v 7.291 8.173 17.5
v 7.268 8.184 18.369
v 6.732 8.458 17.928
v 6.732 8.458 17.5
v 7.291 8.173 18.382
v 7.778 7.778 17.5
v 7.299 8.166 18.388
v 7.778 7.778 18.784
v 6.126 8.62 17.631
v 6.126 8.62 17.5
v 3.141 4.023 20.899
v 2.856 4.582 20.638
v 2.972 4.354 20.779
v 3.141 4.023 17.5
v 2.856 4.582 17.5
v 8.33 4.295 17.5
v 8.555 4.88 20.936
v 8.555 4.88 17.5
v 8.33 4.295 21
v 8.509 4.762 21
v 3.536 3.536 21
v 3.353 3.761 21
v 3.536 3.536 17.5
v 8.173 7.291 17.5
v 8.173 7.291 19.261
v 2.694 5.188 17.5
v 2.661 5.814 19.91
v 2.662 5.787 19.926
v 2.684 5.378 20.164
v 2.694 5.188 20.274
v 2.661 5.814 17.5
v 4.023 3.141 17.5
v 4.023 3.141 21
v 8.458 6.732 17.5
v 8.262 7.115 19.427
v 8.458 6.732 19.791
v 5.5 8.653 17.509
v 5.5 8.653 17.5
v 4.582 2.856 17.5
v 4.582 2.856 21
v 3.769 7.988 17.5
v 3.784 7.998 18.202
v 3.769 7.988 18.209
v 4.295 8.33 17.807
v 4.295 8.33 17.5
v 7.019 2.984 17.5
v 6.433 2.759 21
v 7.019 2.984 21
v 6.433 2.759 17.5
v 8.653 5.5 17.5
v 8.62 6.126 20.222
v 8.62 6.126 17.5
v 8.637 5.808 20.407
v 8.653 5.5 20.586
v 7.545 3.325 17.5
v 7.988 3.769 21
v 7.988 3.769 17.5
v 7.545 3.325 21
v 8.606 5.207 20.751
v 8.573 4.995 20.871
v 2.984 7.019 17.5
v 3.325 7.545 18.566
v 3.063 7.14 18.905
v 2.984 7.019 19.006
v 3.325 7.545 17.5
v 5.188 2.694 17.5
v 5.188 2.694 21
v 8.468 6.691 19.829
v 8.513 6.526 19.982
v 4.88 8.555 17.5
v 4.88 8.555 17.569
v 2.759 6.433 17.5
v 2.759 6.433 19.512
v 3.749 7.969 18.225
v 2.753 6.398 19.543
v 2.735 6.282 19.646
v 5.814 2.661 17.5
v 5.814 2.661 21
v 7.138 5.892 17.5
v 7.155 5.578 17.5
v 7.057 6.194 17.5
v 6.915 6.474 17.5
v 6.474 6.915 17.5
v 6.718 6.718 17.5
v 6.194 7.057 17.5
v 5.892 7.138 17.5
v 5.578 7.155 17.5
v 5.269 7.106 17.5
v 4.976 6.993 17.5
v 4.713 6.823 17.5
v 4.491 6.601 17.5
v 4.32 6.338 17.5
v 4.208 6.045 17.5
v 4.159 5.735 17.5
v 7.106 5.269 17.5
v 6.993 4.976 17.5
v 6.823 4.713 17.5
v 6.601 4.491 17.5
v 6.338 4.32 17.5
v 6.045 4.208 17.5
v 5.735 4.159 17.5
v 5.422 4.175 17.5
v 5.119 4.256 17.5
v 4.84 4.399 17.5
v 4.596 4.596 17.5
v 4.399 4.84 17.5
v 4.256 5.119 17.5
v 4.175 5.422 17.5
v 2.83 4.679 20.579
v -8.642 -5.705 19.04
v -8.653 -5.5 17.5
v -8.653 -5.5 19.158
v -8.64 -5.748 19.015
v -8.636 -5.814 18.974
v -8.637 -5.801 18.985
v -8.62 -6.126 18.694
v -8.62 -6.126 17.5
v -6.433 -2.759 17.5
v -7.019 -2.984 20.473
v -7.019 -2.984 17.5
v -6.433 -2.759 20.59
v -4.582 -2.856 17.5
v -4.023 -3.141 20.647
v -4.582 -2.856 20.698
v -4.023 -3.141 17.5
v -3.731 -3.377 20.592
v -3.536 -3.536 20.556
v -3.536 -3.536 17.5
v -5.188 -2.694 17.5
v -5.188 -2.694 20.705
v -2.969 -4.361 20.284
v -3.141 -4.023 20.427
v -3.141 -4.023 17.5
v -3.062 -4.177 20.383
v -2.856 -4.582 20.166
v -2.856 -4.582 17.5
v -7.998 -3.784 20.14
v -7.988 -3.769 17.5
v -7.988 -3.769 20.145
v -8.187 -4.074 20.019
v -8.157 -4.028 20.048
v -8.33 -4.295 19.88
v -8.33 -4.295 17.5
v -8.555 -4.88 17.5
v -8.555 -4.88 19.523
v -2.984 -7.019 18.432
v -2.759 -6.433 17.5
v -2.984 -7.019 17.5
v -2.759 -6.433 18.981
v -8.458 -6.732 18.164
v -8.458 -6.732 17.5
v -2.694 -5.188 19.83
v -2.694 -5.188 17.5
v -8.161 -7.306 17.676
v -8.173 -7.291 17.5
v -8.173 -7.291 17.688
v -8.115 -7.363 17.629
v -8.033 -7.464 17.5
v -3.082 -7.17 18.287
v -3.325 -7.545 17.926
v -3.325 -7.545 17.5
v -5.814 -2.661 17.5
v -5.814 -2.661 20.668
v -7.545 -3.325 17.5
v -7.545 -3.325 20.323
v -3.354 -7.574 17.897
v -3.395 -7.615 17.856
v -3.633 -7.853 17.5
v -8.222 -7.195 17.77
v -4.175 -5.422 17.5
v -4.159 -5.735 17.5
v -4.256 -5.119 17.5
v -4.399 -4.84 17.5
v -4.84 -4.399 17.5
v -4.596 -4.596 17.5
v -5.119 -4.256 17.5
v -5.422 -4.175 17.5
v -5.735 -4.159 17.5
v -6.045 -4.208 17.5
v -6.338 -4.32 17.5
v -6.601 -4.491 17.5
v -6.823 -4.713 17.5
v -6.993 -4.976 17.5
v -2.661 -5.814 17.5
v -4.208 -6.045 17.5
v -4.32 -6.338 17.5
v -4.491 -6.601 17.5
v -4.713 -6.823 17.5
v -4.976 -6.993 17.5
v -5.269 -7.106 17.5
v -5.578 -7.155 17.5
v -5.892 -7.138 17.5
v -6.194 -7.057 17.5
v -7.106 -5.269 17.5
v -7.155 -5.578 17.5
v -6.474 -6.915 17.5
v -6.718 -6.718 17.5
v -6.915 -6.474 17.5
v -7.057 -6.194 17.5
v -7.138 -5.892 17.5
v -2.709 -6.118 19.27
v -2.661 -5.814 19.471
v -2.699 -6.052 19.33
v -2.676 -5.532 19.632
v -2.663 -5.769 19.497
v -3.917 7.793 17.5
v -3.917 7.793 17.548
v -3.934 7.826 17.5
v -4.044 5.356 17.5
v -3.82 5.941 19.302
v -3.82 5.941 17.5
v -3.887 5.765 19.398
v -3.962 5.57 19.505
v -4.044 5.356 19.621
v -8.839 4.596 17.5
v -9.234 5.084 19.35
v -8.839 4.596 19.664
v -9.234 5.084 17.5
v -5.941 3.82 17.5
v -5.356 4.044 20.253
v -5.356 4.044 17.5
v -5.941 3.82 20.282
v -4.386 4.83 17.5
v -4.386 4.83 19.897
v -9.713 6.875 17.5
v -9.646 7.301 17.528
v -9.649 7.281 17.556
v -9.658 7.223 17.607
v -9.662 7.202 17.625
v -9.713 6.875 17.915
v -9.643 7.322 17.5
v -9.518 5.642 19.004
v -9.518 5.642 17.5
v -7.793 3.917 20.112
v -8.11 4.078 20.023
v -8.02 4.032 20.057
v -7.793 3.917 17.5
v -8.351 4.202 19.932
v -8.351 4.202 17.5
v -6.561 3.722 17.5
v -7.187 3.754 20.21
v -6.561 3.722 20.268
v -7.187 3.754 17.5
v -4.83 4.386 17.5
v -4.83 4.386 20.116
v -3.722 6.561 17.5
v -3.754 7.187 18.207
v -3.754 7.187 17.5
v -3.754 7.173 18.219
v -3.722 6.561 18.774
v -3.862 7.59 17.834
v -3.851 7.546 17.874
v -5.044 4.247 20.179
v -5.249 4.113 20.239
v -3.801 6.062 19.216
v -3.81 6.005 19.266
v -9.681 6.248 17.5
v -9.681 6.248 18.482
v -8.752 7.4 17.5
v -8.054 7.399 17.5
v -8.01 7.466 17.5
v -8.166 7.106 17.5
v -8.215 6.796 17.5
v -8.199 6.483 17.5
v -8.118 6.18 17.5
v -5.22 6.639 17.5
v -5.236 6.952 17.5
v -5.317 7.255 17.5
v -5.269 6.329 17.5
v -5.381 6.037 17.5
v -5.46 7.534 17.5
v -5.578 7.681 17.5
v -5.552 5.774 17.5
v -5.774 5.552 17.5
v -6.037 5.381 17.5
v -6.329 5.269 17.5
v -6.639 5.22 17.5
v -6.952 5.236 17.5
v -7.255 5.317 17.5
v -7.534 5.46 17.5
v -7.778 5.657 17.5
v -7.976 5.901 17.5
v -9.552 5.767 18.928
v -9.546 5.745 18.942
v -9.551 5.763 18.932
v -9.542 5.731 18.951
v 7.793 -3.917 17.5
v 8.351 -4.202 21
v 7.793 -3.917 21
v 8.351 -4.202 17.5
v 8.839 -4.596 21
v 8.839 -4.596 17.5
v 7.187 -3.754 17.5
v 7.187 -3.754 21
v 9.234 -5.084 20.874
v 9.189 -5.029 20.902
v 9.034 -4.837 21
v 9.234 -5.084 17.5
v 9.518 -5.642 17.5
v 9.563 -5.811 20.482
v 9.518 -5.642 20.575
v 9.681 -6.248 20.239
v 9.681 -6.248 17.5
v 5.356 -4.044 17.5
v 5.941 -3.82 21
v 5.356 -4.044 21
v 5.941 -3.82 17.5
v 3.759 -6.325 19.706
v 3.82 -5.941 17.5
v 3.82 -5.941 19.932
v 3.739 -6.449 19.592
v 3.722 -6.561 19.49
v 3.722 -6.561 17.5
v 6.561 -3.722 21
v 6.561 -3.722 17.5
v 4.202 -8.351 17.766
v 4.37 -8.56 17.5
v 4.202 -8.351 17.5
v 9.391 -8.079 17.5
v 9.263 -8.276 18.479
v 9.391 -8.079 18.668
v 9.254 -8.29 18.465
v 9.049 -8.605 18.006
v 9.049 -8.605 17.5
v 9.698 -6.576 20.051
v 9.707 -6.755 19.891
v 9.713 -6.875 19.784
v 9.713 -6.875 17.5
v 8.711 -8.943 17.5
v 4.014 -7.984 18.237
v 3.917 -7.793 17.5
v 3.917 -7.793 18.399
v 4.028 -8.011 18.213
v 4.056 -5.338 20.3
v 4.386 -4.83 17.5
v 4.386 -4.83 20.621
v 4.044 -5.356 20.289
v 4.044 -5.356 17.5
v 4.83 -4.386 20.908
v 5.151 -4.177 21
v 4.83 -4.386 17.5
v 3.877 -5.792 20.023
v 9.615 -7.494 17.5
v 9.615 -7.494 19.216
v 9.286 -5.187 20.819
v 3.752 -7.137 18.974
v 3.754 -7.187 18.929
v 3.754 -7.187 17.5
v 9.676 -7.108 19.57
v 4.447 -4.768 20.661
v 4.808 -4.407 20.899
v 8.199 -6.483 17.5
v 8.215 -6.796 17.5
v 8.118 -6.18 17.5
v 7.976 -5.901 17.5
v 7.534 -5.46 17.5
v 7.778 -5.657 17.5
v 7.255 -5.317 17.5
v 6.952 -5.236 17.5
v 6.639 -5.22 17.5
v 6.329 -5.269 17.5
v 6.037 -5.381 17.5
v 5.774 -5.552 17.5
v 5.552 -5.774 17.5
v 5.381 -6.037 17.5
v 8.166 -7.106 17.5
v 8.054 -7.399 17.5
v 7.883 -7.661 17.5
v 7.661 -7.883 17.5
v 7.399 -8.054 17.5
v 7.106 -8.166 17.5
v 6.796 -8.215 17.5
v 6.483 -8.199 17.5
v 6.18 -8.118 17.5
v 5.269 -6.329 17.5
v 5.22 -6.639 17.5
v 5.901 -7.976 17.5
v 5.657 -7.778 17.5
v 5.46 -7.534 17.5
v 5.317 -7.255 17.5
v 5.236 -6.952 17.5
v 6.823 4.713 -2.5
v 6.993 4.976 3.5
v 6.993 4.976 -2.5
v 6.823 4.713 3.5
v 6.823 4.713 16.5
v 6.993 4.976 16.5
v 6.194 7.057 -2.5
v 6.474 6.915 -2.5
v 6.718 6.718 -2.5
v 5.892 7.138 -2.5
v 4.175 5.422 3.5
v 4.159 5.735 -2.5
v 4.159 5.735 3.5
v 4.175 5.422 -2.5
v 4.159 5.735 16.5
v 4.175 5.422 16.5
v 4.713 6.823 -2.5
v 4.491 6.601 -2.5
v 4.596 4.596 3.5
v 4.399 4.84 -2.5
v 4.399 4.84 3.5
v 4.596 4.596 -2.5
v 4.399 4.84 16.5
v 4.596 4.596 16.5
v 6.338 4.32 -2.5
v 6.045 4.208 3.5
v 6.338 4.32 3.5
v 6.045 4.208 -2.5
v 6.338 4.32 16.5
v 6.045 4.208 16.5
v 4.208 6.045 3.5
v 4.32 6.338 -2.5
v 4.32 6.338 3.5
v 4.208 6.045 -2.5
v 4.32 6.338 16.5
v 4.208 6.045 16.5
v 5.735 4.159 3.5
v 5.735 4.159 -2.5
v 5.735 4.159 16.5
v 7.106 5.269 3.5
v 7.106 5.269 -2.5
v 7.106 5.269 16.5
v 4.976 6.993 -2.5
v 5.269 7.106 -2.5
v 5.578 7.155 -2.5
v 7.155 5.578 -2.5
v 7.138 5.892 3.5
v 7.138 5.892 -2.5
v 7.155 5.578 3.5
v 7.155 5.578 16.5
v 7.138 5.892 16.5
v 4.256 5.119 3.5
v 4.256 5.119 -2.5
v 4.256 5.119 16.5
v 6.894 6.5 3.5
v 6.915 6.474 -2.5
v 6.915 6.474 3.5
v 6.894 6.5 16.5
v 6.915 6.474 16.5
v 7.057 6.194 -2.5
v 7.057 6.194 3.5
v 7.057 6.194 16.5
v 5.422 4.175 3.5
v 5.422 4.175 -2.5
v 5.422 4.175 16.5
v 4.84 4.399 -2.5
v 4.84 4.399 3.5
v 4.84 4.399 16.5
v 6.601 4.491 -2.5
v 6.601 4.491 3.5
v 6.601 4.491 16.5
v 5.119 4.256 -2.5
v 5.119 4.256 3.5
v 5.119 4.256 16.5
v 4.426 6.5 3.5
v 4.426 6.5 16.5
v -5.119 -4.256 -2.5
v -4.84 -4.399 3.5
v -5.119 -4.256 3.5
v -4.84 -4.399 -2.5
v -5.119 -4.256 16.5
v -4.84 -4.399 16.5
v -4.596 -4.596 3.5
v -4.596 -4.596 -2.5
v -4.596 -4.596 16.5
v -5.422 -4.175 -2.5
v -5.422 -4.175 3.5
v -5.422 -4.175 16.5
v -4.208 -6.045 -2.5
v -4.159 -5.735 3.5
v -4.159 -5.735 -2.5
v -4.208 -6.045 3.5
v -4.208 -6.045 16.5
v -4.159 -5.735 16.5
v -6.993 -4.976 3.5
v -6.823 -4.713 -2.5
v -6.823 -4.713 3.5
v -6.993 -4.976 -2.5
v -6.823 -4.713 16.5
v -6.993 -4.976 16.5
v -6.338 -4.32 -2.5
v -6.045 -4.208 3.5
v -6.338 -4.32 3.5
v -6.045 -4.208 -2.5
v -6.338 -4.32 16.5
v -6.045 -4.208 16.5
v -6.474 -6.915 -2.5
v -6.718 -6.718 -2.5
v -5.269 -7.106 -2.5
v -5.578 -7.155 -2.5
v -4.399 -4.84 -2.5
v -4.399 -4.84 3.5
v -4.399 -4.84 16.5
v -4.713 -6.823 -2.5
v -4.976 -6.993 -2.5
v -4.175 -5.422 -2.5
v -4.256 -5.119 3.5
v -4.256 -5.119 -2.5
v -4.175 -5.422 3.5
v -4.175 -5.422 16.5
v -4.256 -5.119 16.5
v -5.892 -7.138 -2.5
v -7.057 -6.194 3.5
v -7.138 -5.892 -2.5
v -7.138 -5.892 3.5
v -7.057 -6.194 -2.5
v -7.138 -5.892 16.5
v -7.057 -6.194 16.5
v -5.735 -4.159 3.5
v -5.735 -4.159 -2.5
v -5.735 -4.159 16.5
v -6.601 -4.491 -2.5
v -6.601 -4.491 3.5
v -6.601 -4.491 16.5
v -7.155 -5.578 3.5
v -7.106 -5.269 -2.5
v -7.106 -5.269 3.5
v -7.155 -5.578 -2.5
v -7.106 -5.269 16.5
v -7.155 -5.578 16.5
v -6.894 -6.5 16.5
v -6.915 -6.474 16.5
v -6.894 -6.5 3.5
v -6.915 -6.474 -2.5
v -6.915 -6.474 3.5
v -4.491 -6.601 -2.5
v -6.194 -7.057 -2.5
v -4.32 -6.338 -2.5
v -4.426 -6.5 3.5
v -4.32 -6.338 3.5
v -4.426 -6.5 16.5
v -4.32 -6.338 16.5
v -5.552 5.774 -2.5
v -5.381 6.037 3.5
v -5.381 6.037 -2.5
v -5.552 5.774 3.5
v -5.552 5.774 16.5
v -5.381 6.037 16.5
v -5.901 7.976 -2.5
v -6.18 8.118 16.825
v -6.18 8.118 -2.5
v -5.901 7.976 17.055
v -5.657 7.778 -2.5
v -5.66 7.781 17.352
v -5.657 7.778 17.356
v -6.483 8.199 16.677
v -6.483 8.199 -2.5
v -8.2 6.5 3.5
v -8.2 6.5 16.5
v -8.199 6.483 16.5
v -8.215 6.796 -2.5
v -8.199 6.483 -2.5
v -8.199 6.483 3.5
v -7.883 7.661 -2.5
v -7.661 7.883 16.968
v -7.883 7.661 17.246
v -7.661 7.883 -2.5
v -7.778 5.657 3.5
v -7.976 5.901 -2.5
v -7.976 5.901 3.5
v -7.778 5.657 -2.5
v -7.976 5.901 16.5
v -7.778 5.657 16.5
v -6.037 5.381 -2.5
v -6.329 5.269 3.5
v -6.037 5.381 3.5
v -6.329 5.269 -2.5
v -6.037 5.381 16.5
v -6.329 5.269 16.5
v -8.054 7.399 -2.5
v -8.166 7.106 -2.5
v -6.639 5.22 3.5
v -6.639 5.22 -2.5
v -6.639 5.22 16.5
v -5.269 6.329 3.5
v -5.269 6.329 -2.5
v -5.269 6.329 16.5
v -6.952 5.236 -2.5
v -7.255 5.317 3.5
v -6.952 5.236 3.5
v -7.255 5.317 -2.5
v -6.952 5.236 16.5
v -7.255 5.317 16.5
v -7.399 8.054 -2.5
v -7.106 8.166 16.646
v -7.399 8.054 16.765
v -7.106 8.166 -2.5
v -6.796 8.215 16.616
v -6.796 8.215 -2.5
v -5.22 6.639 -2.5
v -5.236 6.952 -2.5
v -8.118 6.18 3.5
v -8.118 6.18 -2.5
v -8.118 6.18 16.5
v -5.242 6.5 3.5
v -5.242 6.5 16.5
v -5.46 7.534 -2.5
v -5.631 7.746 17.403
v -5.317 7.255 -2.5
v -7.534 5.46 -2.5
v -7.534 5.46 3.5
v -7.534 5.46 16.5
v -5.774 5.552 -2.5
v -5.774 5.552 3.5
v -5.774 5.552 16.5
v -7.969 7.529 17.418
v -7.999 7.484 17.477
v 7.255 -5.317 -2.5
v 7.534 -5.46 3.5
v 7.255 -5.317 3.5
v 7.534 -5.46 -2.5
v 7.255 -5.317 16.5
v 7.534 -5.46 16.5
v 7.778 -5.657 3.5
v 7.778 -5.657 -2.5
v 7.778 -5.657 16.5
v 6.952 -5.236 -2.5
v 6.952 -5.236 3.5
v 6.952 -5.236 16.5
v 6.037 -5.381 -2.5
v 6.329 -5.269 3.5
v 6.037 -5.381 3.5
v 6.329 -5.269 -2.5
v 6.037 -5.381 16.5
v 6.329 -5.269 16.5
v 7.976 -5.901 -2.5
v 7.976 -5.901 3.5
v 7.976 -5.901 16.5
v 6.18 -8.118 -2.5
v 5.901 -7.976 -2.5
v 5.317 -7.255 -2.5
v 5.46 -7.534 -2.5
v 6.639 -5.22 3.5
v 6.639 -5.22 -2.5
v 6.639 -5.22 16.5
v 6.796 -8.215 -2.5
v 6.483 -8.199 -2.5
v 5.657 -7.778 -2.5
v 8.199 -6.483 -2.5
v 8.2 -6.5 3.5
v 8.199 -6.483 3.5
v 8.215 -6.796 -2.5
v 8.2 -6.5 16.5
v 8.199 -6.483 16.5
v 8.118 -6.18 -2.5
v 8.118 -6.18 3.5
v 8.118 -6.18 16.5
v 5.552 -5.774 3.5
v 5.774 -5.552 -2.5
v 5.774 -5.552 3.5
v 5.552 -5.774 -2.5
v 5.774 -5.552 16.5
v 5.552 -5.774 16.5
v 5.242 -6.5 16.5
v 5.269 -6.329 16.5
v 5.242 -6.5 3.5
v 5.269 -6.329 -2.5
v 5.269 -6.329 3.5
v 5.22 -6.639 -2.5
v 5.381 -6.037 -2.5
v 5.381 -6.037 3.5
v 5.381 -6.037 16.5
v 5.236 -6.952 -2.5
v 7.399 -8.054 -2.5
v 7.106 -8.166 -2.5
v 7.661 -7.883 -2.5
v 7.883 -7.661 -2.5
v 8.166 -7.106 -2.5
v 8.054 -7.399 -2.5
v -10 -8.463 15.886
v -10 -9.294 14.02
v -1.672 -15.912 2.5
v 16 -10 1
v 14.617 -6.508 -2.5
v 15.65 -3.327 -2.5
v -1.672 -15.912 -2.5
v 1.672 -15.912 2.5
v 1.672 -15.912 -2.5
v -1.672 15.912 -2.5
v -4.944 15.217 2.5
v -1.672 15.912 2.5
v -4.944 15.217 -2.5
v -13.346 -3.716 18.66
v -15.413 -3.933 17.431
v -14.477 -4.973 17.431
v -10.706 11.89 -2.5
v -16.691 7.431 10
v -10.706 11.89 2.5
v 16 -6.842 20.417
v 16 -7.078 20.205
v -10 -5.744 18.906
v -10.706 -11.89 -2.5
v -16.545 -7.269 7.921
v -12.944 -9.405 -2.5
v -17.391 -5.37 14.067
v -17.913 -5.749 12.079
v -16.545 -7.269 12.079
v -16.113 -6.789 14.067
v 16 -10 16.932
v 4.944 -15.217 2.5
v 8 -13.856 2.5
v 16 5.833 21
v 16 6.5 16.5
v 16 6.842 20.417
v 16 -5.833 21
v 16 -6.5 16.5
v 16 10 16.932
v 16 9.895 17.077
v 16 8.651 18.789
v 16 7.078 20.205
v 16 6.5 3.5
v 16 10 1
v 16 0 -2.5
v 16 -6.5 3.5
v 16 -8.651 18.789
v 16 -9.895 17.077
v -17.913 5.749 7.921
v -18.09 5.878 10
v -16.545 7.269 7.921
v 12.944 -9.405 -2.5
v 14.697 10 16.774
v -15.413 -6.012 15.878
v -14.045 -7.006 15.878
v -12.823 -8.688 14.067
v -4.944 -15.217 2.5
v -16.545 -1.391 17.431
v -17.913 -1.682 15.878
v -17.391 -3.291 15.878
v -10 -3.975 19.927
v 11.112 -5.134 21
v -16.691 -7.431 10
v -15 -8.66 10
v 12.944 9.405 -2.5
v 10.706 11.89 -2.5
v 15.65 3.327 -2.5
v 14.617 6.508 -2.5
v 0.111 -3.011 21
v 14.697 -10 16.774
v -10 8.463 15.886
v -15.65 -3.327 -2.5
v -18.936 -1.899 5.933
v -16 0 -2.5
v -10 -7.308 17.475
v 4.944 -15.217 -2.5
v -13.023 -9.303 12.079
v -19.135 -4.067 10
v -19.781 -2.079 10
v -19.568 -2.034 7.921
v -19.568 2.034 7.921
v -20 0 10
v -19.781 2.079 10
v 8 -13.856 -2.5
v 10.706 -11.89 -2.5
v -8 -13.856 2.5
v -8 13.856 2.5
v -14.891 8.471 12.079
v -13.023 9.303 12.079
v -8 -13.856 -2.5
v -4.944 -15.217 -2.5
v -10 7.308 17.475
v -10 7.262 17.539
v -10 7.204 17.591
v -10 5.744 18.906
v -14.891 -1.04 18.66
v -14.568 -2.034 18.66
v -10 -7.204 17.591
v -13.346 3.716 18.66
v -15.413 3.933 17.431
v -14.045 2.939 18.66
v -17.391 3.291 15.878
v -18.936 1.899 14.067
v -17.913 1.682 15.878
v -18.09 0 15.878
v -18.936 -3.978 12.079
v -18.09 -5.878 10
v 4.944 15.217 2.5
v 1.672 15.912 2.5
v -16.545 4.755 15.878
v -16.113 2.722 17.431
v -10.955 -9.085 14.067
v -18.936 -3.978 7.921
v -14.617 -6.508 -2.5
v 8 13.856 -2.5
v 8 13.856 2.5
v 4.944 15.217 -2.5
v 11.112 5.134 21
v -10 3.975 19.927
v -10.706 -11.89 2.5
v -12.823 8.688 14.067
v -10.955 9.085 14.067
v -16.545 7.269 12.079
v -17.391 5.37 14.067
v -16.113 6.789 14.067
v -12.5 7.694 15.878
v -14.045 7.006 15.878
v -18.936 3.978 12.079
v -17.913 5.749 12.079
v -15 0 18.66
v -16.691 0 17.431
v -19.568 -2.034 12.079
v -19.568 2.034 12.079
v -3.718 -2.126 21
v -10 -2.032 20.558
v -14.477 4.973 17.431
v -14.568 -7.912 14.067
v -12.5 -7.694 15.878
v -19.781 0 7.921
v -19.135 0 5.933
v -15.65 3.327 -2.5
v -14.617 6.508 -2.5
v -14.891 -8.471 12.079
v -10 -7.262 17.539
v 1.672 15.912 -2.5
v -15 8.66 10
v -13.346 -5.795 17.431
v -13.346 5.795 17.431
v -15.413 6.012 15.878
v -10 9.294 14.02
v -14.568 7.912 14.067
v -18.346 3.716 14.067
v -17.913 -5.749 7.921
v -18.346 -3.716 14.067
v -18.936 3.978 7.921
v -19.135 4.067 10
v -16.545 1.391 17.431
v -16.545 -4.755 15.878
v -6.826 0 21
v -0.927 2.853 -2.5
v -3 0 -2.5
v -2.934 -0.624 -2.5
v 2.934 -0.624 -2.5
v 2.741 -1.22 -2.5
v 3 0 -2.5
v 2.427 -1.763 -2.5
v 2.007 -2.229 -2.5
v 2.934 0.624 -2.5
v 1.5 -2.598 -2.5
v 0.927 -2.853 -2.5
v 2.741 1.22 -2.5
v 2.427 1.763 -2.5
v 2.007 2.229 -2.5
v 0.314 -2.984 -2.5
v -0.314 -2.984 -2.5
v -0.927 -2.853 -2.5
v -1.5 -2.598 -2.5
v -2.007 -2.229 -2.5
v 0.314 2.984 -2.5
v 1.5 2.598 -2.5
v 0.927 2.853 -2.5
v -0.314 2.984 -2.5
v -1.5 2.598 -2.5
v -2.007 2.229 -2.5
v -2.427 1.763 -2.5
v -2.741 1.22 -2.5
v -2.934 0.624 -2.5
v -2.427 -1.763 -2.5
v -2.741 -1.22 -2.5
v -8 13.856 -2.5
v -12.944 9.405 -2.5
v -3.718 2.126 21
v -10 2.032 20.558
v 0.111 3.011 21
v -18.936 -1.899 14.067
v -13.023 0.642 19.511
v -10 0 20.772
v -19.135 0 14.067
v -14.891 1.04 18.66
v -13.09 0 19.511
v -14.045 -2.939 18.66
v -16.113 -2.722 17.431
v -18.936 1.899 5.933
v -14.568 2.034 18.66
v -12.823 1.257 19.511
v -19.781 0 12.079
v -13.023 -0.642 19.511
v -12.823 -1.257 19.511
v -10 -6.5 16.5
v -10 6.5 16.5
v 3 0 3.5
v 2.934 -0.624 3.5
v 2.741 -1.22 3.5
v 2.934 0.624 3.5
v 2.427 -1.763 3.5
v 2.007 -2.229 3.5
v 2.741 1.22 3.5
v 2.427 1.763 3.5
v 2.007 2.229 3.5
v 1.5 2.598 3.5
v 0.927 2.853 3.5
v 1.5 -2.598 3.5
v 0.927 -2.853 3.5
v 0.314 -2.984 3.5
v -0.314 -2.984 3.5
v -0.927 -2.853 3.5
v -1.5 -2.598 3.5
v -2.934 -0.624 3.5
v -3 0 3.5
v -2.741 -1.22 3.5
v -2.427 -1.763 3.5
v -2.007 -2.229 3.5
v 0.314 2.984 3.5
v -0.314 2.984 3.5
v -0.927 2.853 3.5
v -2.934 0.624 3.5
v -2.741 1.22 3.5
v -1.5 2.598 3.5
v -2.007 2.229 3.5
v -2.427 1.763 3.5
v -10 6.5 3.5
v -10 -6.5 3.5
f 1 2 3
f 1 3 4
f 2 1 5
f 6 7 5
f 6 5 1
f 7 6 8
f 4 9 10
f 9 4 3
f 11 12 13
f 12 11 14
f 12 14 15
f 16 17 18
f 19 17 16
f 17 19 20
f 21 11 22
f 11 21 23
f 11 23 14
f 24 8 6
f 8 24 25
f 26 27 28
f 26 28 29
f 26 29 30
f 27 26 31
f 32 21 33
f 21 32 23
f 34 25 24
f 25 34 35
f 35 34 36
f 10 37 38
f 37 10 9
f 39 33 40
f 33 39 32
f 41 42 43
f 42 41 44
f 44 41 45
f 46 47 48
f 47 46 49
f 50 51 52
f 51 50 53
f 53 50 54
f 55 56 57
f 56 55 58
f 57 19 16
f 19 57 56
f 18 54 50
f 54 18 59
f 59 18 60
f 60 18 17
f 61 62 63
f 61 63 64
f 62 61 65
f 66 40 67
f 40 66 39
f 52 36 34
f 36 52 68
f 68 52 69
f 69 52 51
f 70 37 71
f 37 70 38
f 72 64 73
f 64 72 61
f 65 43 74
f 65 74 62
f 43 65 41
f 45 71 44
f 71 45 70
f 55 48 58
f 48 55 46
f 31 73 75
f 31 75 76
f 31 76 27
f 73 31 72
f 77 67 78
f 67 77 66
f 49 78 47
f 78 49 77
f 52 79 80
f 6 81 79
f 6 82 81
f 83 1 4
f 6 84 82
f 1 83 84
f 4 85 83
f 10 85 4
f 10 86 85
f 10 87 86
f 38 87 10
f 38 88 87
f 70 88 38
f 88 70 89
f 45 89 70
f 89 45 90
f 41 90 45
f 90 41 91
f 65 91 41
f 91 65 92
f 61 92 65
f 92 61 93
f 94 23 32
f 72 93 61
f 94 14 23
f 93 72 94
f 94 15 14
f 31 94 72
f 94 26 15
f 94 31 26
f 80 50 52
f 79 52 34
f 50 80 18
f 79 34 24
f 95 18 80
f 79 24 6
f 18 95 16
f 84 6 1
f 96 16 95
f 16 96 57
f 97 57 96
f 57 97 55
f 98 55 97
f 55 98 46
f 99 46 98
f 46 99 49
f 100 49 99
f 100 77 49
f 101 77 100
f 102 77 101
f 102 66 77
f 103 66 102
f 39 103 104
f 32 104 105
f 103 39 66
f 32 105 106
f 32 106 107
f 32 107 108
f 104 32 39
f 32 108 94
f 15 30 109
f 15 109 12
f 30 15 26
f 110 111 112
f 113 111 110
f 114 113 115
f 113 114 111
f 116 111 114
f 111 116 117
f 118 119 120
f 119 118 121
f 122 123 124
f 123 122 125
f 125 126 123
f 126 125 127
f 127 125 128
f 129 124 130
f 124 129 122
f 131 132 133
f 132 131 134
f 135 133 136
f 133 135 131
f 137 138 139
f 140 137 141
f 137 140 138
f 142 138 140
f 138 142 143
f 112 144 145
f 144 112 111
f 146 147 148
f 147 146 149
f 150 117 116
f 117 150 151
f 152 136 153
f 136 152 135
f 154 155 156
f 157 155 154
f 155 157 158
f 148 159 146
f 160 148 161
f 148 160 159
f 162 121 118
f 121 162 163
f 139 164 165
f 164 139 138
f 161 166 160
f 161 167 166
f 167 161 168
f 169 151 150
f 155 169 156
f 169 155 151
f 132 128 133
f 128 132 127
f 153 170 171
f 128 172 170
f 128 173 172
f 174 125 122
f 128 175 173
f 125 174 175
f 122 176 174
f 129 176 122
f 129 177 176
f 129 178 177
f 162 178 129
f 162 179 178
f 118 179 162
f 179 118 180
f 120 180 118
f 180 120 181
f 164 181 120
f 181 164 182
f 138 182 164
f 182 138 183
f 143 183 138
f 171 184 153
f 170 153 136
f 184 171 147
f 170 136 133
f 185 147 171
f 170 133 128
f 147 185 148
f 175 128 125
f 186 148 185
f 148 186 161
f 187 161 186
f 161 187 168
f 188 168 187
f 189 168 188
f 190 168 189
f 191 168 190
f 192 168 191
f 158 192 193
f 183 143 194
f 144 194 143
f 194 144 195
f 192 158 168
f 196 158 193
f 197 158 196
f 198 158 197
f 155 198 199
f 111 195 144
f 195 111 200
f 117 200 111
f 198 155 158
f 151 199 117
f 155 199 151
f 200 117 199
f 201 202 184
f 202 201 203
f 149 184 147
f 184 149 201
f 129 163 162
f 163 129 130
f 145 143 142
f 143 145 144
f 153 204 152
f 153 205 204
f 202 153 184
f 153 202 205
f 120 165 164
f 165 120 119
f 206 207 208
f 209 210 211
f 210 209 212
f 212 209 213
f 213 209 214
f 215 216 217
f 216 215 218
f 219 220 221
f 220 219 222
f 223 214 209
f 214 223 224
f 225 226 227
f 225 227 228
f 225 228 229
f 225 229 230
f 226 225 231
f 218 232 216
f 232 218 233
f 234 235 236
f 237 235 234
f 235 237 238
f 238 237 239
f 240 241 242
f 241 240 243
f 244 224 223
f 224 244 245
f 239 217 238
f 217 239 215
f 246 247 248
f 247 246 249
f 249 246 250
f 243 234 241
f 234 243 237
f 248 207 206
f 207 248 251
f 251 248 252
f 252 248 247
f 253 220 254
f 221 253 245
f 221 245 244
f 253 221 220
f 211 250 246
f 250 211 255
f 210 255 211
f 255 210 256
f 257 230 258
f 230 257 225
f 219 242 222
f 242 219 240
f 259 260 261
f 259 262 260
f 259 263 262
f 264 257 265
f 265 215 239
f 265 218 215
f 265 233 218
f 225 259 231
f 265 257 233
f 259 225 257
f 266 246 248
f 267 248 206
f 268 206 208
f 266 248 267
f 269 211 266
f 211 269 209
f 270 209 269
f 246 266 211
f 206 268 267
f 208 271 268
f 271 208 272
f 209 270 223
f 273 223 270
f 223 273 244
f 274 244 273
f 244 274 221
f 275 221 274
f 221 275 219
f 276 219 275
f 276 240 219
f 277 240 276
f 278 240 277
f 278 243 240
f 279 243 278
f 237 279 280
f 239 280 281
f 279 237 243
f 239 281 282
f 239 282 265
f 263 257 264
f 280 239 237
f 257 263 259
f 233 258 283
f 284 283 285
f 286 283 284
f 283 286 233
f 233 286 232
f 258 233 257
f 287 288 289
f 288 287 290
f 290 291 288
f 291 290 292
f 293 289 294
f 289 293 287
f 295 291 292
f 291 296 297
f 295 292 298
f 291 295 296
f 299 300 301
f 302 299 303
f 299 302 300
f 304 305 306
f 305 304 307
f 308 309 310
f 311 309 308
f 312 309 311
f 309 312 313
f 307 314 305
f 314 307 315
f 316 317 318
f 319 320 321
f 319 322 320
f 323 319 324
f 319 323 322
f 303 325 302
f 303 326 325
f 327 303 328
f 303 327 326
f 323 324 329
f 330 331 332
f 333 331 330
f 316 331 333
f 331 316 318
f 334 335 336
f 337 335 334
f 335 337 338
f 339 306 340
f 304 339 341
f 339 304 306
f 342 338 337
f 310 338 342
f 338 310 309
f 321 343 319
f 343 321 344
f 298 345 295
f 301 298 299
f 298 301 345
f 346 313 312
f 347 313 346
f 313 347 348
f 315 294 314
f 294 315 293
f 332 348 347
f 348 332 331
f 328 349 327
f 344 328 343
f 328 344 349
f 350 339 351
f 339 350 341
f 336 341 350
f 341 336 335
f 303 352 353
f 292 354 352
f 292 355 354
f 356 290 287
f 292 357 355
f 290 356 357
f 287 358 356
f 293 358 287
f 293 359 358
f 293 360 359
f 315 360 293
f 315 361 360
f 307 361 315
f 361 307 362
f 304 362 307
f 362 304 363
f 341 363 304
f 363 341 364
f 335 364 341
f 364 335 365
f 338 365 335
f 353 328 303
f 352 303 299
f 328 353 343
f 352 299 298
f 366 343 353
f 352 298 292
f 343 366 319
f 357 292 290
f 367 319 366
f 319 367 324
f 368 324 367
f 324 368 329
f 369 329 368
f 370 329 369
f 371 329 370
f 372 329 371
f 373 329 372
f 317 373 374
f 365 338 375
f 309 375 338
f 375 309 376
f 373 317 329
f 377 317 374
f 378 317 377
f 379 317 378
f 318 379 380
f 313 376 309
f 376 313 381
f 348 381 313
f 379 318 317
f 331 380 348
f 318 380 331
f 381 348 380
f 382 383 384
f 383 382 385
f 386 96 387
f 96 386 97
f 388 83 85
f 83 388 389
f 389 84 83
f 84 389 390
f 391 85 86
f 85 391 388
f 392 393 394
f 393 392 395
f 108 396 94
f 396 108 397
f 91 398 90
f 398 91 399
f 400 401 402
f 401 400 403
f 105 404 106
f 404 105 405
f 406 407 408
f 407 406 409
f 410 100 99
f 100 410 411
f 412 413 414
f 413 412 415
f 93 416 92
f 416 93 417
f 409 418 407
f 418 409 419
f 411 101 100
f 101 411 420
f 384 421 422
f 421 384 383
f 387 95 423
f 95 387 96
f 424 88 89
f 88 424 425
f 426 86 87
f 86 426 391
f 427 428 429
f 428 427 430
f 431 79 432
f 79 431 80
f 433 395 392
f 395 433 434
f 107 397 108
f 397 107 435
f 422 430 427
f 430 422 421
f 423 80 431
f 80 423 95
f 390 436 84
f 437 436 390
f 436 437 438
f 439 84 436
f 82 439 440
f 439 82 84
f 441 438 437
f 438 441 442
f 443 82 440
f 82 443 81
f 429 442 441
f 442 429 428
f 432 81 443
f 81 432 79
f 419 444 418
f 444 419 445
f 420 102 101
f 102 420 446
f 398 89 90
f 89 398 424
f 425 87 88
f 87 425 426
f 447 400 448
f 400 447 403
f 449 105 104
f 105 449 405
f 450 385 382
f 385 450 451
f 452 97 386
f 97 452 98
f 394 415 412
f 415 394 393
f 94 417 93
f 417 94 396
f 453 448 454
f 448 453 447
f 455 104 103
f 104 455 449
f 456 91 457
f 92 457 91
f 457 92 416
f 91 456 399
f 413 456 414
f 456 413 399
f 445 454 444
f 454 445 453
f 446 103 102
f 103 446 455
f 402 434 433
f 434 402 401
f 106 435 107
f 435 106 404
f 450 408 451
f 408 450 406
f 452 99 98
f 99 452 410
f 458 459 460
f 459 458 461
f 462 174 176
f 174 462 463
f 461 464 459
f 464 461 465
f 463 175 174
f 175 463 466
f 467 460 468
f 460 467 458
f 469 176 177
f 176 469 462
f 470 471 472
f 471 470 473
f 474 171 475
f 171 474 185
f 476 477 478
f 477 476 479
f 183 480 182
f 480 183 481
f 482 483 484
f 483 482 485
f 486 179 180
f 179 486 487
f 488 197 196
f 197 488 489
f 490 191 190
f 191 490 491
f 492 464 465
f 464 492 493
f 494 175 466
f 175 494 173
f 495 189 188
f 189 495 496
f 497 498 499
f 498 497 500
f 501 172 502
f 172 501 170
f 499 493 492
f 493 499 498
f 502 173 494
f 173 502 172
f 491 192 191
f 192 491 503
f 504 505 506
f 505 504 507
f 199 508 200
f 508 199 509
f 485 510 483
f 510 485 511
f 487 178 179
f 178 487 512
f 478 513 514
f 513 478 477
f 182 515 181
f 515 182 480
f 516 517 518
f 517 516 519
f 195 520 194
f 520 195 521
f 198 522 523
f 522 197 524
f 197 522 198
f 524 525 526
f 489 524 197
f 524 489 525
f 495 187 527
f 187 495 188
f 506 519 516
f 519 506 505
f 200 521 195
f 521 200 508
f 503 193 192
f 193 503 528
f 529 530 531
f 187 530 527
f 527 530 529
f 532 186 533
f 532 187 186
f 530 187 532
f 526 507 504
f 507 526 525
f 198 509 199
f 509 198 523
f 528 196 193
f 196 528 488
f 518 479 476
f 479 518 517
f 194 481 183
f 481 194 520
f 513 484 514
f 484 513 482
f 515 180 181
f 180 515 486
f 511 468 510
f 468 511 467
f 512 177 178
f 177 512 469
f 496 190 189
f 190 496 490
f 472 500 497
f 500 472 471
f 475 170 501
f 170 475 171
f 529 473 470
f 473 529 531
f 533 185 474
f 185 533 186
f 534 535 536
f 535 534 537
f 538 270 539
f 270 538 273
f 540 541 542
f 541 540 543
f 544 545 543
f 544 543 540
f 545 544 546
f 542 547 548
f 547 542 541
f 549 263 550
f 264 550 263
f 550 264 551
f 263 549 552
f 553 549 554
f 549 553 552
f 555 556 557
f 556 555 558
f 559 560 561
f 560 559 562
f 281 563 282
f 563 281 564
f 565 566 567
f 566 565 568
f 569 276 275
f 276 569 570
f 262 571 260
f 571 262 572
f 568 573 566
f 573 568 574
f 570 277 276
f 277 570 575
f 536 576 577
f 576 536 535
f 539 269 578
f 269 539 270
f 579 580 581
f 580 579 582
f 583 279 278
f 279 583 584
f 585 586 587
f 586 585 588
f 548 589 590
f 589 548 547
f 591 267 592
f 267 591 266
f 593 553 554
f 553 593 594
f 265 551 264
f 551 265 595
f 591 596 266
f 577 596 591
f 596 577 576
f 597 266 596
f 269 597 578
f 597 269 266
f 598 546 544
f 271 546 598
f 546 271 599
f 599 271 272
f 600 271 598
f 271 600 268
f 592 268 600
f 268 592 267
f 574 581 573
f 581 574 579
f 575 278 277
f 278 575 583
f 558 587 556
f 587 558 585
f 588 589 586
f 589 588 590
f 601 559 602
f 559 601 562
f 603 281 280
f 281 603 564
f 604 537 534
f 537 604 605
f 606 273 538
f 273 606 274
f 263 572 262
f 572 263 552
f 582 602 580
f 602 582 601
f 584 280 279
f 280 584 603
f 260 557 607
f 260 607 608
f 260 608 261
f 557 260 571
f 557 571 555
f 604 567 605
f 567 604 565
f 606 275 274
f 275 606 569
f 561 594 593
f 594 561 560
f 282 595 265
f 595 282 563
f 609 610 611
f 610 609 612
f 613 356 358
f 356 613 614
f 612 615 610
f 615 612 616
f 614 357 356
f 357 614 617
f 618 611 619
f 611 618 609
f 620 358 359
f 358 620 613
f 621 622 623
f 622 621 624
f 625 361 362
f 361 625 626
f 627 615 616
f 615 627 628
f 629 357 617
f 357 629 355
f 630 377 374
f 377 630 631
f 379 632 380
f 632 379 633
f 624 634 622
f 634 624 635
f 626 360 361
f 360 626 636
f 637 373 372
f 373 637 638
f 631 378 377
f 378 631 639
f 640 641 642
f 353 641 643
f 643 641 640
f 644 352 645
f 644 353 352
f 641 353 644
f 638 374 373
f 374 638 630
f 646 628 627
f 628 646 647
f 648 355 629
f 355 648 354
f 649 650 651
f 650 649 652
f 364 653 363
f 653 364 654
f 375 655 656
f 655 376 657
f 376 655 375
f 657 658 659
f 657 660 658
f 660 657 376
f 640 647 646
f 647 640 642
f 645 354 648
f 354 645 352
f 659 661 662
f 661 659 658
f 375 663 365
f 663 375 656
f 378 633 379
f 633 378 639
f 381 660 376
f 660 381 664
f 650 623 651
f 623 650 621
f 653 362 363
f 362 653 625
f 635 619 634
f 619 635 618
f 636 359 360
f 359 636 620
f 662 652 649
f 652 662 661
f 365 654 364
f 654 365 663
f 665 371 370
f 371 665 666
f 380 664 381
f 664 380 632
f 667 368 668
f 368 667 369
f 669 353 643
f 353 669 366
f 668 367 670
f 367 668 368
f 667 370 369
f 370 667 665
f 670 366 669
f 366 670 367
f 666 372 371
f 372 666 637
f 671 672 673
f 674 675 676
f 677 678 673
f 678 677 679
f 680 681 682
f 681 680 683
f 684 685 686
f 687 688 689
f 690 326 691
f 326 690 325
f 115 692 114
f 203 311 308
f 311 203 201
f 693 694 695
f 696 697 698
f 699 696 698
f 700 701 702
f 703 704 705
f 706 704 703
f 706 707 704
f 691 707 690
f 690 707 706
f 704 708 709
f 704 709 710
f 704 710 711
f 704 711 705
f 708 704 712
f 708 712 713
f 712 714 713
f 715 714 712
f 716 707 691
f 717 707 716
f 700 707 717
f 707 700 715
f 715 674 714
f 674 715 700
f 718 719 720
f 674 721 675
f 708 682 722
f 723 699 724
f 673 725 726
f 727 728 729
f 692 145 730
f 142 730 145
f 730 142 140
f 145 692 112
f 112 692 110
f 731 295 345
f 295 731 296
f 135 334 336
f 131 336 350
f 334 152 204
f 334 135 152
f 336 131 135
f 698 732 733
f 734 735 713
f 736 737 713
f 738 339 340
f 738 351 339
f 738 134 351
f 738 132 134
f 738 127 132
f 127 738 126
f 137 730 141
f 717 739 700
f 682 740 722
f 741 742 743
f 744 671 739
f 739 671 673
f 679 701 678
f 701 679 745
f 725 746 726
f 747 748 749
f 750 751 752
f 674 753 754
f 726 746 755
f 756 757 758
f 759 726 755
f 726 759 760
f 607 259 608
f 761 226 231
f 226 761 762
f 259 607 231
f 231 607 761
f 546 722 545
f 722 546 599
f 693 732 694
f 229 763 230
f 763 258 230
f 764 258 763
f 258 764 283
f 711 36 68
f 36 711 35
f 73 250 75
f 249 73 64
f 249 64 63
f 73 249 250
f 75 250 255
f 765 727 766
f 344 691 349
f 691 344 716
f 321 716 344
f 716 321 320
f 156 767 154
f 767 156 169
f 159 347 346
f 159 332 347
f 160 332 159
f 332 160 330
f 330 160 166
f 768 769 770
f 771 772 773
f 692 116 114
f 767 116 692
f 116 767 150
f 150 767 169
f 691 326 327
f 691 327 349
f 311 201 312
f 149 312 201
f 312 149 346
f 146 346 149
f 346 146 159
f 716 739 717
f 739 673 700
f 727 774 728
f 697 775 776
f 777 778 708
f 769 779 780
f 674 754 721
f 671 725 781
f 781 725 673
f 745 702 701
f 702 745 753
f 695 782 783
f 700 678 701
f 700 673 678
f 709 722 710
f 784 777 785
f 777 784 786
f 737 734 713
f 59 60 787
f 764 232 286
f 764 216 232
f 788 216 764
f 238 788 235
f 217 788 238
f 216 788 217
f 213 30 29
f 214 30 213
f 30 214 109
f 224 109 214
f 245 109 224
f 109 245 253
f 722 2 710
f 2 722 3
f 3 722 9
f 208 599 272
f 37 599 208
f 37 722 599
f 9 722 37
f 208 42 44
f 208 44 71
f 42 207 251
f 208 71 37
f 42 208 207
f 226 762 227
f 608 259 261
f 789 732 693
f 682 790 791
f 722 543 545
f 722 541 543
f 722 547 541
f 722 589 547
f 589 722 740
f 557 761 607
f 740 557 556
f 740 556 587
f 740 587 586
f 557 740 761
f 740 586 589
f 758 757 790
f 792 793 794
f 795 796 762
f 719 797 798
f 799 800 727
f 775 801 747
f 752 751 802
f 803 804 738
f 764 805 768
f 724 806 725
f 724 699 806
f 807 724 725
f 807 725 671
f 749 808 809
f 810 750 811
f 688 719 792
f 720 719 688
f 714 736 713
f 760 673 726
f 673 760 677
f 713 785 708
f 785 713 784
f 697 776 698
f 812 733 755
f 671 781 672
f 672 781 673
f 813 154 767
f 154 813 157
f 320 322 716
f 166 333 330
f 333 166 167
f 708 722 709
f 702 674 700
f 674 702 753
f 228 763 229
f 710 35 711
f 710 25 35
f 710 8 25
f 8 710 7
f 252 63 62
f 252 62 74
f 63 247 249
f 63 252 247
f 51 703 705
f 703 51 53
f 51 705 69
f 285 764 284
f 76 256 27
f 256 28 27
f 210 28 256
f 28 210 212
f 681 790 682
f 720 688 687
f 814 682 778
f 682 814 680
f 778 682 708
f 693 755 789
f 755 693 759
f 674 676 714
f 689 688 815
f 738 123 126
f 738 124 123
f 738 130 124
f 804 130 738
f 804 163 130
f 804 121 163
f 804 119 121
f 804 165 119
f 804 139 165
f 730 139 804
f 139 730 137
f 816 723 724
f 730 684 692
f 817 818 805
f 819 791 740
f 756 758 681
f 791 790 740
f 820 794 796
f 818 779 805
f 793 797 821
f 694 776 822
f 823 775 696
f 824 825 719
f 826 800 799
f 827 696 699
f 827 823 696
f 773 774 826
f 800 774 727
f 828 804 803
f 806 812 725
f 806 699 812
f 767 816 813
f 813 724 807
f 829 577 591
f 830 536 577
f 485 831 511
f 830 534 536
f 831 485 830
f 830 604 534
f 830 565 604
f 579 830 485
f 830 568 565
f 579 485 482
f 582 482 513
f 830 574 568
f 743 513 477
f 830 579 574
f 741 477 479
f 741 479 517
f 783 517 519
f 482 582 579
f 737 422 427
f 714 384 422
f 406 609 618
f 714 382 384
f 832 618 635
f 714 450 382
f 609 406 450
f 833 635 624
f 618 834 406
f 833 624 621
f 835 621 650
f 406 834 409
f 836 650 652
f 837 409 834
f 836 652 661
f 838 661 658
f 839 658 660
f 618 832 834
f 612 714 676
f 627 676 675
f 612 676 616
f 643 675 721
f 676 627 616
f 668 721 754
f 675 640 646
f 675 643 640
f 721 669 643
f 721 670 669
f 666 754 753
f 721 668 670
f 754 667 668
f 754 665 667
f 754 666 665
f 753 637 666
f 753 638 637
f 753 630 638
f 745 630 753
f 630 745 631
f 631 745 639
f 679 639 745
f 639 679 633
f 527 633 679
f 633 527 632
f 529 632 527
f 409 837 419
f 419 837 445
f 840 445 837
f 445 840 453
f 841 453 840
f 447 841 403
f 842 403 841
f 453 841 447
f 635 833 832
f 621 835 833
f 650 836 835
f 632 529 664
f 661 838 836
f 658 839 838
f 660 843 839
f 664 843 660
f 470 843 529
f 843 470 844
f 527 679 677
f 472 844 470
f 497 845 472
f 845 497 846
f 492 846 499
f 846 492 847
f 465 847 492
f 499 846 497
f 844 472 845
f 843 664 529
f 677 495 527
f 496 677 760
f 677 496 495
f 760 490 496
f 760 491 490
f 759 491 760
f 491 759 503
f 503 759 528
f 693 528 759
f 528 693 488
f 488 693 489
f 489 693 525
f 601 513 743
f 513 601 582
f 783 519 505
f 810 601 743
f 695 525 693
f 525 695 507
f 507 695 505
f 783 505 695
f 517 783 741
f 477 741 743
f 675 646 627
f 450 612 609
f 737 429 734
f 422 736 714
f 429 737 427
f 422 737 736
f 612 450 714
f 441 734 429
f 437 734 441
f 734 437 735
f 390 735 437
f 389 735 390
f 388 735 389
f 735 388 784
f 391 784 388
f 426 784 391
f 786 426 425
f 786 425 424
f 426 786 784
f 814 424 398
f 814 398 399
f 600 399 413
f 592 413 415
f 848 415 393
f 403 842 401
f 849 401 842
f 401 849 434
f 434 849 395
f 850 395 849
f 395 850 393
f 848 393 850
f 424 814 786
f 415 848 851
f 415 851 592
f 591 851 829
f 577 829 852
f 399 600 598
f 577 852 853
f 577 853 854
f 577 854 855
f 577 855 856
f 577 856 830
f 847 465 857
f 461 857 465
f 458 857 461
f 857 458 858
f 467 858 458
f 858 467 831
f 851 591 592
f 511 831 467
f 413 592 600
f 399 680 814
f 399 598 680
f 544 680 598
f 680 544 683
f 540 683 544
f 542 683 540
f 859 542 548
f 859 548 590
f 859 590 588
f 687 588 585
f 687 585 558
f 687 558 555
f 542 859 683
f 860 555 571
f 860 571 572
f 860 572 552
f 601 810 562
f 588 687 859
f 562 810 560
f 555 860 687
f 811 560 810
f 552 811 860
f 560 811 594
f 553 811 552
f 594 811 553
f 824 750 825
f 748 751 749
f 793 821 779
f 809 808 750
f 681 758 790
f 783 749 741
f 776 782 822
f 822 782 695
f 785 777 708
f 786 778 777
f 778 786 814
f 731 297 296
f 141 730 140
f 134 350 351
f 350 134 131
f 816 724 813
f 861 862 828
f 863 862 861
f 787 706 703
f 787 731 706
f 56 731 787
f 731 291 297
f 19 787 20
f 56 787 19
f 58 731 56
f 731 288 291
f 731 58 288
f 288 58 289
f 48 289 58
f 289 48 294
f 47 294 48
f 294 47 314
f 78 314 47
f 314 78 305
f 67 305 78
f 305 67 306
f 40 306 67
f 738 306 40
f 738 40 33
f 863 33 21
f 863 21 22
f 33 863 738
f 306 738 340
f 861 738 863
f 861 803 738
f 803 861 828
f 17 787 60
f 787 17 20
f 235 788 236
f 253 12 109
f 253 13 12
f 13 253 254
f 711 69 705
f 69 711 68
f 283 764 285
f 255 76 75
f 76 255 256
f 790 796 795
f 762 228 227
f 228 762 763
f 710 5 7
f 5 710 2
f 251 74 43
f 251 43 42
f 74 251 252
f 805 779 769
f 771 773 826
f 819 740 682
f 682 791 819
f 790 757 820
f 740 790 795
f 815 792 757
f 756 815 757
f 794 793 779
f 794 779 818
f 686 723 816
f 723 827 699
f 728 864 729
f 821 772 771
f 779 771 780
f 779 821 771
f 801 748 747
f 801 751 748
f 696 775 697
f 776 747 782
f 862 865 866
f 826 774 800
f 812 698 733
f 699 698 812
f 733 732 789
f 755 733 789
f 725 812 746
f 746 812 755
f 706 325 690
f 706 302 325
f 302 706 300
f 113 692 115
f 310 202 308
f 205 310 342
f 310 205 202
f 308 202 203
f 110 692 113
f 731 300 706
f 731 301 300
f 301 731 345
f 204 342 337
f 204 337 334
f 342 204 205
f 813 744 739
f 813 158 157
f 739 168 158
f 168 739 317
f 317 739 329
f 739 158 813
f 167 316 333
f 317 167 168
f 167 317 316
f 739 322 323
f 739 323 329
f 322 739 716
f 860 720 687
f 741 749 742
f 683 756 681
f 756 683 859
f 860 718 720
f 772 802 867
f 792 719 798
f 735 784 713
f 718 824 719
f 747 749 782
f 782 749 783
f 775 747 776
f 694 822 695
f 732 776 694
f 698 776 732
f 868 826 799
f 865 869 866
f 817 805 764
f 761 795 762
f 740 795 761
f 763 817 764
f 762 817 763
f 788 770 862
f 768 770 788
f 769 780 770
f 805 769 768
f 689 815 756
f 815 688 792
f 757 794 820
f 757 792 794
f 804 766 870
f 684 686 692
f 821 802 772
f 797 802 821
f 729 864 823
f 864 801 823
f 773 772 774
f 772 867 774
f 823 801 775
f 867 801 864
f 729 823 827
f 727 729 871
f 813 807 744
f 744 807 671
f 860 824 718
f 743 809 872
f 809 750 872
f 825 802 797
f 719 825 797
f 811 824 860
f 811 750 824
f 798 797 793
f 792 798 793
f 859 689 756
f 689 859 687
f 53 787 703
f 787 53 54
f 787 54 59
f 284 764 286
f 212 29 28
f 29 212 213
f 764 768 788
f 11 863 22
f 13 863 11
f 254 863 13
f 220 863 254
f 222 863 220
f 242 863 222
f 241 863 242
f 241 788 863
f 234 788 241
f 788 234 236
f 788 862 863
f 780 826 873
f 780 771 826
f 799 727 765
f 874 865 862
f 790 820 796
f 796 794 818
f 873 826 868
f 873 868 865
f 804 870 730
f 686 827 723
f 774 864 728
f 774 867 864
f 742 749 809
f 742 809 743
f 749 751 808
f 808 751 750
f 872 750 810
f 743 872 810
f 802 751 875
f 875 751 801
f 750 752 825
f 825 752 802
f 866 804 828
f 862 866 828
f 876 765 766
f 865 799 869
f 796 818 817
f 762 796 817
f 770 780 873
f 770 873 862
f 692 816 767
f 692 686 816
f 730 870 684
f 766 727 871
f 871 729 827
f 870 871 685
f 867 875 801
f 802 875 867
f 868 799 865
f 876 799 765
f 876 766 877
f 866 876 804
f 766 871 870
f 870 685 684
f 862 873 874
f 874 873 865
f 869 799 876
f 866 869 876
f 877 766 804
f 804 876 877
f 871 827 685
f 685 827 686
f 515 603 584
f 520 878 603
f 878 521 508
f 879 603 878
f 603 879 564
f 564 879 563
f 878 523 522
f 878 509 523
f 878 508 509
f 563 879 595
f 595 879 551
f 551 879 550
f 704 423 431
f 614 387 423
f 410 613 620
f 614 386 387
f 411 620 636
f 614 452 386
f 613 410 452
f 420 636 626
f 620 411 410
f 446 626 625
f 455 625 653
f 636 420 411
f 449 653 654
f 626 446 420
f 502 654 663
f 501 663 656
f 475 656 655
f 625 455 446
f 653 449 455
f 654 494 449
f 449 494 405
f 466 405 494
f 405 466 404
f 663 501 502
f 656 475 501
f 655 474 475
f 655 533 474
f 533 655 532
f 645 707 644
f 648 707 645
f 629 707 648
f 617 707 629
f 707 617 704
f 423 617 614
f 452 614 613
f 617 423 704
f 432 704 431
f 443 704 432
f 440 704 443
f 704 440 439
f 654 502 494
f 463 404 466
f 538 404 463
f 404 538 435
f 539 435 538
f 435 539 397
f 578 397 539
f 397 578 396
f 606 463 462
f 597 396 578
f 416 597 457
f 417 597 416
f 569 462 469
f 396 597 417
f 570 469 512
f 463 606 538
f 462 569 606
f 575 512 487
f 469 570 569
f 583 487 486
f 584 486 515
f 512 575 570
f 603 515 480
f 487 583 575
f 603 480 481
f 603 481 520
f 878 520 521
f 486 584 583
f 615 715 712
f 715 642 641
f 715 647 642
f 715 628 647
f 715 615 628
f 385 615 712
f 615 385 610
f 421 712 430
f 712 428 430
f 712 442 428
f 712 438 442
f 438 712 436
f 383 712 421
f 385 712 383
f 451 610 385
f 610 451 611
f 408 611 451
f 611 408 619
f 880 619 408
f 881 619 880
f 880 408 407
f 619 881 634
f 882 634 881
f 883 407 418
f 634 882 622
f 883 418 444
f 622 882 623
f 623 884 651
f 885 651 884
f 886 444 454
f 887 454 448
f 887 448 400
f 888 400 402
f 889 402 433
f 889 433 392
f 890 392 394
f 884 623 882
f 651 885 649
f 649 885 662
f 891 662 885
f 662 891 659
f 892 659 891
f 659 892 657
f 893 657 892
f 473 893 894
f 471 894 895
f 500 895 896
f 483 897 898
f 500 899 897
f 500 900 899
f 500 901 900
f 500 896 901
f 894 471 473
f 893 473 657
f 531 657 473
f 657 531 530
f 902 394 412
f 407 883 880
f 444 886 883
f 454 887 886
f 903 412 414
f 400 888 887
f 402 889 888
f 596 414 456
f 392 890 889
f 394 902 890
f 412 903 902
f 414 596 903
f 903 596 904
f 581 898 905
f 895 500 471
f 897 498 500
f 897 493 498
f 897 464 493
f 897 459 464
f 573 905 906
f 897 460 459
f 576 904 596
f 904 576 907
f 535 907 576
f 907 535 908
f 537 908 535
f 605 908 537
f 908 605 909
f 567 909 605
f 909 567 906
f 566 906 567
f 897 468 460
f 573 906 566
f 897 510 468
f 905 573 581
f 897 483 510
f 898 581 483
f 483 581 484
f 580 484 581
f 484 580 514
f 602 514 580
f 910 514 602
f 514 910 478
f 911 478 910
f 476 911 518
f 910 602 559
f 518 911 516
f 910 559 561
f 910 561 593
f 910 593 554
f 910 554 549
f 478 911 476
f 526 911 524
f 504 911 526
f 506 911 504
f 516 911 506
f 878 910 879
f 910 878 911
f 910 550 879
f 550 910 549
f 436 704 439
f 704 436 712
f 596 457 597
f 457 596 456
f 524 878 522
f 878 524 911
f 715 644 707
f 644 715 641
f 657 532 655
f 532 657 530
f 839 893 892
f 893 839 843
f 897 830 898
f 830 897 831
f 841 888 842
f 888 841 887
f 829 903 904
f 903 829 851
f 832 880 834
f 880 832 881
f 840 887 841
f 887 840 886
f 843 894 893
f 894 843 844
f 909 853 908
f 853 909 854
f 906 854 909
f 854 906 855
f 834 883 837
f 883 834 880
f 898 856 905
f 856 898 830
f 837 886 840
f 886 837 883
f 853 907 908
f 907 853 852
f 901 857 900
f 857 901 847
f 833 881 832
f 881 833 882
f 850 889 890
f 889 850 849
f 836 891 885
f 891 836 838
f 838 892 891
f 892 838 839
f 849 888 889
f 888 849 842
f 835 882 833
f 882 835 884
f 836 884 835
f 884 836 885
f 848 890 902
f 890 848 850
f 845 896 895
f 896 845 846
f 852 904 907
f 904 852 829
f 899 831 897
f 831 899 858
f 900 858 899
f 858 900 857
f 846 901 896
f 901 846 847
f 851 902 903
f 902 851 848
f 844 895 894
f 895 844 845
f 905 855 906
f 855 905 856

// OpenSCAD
/* [Motor Bolts] */
Motor_Bolt_X_spacing = 16; // Motor Bolts X distance
Motor_Bolt_Y_spacing = 19; // Motor Bolts Y distance
Screw_Size = 3; // Screw Size

/* [Motor Plate] */
Plate_Thickness = 5;
Plate_Diameter = 32;

/* [Arm Size] */
arm_outside_diameter = 13;

/* [Shell Size] */
Shell_OD = 20;

/* [Hidden] */
$fs = 0.2;
Plate_Radius = Plate_Diameter/2;


difference() {
    hull() {
        difference() {
            // Shell
            translate([3,0,11]) cube([26,Shell_OD,Shell_OD],true);
            // Shell clipping shape
            difference() {
                translate([5,0,11]) cube([32,Shell_OD+1,Shell_OD+1],true);      
                translate([5,0,11]) rotate([0,90,0]) cylinder(32,9.7,12,true);
                translate([5,0,0]) cube([40,Shell_OD+1,Shell_OD+1],true);
            }
        }
        // Motor Plate
        cylinder(Plate_Thickness,Plate_Radius,Plate_Radius,true);
        // End Ball
        translate([-Shell_OD/2,0,Shell_OD/2]) sphere(Shell_OD/2);
    }
    // Remove arm material
    translate ([20,0,10]) cube([60,arm_outside_diameter,arm_outside_diameter],true);
    // Remove motor post material
    translate([0,0,30]) motor_posts(25);
    // Remove motor screw material
    motor_screws(50);
    // Remove motor shaft clerance
    translate([0,0,0]) cylinder(8,3,3,true);
}

module motor_posts(sl=10) {
    rotate([0,0,45]) {
    translate([Motor_Bolt_X_spacing/2,0,0]) cylinder(sl,Screw_Size,Screw_Size,true);
    translate([-Motor_Bolt_X_spacing/2,0,0]) cylinder(sl,Screw_Size,Screw_Size,true);
    translate([0,Motor_Bolt_Y_spacing/2,0]) cylinder(sl,Screw_Size,Screw_Size,true);
    translate([0,-Motor_Bolt_Y_spacing/2,0]) cylinder(sl,Screw_Size,Screw_Size,true);
    }
}

module motor_screws(sl=10) {
    rotate([0,0,45]) {
    translate([Motor_Bolt_X_spacing/2,0,0]) cylinder(sl,Screw_Size/2,Screw_Size/2,true);
    translate([-Motor_Bolt_X_spacing/2,0,0]) cylinder(sl,Screw_Size/2,Screw_Size/2,true);
    translate([0,Motor_Bolt_Y_spacing/2,0]) cylinder(sl,Screw_Size/2,Screw_Size/2,true);
    translate([0/2,-Motor_Bolt_Y_spacing/2,0]) cylinder(sl,Screw_Size/2,Screw_Size/2,true);
    }
}
